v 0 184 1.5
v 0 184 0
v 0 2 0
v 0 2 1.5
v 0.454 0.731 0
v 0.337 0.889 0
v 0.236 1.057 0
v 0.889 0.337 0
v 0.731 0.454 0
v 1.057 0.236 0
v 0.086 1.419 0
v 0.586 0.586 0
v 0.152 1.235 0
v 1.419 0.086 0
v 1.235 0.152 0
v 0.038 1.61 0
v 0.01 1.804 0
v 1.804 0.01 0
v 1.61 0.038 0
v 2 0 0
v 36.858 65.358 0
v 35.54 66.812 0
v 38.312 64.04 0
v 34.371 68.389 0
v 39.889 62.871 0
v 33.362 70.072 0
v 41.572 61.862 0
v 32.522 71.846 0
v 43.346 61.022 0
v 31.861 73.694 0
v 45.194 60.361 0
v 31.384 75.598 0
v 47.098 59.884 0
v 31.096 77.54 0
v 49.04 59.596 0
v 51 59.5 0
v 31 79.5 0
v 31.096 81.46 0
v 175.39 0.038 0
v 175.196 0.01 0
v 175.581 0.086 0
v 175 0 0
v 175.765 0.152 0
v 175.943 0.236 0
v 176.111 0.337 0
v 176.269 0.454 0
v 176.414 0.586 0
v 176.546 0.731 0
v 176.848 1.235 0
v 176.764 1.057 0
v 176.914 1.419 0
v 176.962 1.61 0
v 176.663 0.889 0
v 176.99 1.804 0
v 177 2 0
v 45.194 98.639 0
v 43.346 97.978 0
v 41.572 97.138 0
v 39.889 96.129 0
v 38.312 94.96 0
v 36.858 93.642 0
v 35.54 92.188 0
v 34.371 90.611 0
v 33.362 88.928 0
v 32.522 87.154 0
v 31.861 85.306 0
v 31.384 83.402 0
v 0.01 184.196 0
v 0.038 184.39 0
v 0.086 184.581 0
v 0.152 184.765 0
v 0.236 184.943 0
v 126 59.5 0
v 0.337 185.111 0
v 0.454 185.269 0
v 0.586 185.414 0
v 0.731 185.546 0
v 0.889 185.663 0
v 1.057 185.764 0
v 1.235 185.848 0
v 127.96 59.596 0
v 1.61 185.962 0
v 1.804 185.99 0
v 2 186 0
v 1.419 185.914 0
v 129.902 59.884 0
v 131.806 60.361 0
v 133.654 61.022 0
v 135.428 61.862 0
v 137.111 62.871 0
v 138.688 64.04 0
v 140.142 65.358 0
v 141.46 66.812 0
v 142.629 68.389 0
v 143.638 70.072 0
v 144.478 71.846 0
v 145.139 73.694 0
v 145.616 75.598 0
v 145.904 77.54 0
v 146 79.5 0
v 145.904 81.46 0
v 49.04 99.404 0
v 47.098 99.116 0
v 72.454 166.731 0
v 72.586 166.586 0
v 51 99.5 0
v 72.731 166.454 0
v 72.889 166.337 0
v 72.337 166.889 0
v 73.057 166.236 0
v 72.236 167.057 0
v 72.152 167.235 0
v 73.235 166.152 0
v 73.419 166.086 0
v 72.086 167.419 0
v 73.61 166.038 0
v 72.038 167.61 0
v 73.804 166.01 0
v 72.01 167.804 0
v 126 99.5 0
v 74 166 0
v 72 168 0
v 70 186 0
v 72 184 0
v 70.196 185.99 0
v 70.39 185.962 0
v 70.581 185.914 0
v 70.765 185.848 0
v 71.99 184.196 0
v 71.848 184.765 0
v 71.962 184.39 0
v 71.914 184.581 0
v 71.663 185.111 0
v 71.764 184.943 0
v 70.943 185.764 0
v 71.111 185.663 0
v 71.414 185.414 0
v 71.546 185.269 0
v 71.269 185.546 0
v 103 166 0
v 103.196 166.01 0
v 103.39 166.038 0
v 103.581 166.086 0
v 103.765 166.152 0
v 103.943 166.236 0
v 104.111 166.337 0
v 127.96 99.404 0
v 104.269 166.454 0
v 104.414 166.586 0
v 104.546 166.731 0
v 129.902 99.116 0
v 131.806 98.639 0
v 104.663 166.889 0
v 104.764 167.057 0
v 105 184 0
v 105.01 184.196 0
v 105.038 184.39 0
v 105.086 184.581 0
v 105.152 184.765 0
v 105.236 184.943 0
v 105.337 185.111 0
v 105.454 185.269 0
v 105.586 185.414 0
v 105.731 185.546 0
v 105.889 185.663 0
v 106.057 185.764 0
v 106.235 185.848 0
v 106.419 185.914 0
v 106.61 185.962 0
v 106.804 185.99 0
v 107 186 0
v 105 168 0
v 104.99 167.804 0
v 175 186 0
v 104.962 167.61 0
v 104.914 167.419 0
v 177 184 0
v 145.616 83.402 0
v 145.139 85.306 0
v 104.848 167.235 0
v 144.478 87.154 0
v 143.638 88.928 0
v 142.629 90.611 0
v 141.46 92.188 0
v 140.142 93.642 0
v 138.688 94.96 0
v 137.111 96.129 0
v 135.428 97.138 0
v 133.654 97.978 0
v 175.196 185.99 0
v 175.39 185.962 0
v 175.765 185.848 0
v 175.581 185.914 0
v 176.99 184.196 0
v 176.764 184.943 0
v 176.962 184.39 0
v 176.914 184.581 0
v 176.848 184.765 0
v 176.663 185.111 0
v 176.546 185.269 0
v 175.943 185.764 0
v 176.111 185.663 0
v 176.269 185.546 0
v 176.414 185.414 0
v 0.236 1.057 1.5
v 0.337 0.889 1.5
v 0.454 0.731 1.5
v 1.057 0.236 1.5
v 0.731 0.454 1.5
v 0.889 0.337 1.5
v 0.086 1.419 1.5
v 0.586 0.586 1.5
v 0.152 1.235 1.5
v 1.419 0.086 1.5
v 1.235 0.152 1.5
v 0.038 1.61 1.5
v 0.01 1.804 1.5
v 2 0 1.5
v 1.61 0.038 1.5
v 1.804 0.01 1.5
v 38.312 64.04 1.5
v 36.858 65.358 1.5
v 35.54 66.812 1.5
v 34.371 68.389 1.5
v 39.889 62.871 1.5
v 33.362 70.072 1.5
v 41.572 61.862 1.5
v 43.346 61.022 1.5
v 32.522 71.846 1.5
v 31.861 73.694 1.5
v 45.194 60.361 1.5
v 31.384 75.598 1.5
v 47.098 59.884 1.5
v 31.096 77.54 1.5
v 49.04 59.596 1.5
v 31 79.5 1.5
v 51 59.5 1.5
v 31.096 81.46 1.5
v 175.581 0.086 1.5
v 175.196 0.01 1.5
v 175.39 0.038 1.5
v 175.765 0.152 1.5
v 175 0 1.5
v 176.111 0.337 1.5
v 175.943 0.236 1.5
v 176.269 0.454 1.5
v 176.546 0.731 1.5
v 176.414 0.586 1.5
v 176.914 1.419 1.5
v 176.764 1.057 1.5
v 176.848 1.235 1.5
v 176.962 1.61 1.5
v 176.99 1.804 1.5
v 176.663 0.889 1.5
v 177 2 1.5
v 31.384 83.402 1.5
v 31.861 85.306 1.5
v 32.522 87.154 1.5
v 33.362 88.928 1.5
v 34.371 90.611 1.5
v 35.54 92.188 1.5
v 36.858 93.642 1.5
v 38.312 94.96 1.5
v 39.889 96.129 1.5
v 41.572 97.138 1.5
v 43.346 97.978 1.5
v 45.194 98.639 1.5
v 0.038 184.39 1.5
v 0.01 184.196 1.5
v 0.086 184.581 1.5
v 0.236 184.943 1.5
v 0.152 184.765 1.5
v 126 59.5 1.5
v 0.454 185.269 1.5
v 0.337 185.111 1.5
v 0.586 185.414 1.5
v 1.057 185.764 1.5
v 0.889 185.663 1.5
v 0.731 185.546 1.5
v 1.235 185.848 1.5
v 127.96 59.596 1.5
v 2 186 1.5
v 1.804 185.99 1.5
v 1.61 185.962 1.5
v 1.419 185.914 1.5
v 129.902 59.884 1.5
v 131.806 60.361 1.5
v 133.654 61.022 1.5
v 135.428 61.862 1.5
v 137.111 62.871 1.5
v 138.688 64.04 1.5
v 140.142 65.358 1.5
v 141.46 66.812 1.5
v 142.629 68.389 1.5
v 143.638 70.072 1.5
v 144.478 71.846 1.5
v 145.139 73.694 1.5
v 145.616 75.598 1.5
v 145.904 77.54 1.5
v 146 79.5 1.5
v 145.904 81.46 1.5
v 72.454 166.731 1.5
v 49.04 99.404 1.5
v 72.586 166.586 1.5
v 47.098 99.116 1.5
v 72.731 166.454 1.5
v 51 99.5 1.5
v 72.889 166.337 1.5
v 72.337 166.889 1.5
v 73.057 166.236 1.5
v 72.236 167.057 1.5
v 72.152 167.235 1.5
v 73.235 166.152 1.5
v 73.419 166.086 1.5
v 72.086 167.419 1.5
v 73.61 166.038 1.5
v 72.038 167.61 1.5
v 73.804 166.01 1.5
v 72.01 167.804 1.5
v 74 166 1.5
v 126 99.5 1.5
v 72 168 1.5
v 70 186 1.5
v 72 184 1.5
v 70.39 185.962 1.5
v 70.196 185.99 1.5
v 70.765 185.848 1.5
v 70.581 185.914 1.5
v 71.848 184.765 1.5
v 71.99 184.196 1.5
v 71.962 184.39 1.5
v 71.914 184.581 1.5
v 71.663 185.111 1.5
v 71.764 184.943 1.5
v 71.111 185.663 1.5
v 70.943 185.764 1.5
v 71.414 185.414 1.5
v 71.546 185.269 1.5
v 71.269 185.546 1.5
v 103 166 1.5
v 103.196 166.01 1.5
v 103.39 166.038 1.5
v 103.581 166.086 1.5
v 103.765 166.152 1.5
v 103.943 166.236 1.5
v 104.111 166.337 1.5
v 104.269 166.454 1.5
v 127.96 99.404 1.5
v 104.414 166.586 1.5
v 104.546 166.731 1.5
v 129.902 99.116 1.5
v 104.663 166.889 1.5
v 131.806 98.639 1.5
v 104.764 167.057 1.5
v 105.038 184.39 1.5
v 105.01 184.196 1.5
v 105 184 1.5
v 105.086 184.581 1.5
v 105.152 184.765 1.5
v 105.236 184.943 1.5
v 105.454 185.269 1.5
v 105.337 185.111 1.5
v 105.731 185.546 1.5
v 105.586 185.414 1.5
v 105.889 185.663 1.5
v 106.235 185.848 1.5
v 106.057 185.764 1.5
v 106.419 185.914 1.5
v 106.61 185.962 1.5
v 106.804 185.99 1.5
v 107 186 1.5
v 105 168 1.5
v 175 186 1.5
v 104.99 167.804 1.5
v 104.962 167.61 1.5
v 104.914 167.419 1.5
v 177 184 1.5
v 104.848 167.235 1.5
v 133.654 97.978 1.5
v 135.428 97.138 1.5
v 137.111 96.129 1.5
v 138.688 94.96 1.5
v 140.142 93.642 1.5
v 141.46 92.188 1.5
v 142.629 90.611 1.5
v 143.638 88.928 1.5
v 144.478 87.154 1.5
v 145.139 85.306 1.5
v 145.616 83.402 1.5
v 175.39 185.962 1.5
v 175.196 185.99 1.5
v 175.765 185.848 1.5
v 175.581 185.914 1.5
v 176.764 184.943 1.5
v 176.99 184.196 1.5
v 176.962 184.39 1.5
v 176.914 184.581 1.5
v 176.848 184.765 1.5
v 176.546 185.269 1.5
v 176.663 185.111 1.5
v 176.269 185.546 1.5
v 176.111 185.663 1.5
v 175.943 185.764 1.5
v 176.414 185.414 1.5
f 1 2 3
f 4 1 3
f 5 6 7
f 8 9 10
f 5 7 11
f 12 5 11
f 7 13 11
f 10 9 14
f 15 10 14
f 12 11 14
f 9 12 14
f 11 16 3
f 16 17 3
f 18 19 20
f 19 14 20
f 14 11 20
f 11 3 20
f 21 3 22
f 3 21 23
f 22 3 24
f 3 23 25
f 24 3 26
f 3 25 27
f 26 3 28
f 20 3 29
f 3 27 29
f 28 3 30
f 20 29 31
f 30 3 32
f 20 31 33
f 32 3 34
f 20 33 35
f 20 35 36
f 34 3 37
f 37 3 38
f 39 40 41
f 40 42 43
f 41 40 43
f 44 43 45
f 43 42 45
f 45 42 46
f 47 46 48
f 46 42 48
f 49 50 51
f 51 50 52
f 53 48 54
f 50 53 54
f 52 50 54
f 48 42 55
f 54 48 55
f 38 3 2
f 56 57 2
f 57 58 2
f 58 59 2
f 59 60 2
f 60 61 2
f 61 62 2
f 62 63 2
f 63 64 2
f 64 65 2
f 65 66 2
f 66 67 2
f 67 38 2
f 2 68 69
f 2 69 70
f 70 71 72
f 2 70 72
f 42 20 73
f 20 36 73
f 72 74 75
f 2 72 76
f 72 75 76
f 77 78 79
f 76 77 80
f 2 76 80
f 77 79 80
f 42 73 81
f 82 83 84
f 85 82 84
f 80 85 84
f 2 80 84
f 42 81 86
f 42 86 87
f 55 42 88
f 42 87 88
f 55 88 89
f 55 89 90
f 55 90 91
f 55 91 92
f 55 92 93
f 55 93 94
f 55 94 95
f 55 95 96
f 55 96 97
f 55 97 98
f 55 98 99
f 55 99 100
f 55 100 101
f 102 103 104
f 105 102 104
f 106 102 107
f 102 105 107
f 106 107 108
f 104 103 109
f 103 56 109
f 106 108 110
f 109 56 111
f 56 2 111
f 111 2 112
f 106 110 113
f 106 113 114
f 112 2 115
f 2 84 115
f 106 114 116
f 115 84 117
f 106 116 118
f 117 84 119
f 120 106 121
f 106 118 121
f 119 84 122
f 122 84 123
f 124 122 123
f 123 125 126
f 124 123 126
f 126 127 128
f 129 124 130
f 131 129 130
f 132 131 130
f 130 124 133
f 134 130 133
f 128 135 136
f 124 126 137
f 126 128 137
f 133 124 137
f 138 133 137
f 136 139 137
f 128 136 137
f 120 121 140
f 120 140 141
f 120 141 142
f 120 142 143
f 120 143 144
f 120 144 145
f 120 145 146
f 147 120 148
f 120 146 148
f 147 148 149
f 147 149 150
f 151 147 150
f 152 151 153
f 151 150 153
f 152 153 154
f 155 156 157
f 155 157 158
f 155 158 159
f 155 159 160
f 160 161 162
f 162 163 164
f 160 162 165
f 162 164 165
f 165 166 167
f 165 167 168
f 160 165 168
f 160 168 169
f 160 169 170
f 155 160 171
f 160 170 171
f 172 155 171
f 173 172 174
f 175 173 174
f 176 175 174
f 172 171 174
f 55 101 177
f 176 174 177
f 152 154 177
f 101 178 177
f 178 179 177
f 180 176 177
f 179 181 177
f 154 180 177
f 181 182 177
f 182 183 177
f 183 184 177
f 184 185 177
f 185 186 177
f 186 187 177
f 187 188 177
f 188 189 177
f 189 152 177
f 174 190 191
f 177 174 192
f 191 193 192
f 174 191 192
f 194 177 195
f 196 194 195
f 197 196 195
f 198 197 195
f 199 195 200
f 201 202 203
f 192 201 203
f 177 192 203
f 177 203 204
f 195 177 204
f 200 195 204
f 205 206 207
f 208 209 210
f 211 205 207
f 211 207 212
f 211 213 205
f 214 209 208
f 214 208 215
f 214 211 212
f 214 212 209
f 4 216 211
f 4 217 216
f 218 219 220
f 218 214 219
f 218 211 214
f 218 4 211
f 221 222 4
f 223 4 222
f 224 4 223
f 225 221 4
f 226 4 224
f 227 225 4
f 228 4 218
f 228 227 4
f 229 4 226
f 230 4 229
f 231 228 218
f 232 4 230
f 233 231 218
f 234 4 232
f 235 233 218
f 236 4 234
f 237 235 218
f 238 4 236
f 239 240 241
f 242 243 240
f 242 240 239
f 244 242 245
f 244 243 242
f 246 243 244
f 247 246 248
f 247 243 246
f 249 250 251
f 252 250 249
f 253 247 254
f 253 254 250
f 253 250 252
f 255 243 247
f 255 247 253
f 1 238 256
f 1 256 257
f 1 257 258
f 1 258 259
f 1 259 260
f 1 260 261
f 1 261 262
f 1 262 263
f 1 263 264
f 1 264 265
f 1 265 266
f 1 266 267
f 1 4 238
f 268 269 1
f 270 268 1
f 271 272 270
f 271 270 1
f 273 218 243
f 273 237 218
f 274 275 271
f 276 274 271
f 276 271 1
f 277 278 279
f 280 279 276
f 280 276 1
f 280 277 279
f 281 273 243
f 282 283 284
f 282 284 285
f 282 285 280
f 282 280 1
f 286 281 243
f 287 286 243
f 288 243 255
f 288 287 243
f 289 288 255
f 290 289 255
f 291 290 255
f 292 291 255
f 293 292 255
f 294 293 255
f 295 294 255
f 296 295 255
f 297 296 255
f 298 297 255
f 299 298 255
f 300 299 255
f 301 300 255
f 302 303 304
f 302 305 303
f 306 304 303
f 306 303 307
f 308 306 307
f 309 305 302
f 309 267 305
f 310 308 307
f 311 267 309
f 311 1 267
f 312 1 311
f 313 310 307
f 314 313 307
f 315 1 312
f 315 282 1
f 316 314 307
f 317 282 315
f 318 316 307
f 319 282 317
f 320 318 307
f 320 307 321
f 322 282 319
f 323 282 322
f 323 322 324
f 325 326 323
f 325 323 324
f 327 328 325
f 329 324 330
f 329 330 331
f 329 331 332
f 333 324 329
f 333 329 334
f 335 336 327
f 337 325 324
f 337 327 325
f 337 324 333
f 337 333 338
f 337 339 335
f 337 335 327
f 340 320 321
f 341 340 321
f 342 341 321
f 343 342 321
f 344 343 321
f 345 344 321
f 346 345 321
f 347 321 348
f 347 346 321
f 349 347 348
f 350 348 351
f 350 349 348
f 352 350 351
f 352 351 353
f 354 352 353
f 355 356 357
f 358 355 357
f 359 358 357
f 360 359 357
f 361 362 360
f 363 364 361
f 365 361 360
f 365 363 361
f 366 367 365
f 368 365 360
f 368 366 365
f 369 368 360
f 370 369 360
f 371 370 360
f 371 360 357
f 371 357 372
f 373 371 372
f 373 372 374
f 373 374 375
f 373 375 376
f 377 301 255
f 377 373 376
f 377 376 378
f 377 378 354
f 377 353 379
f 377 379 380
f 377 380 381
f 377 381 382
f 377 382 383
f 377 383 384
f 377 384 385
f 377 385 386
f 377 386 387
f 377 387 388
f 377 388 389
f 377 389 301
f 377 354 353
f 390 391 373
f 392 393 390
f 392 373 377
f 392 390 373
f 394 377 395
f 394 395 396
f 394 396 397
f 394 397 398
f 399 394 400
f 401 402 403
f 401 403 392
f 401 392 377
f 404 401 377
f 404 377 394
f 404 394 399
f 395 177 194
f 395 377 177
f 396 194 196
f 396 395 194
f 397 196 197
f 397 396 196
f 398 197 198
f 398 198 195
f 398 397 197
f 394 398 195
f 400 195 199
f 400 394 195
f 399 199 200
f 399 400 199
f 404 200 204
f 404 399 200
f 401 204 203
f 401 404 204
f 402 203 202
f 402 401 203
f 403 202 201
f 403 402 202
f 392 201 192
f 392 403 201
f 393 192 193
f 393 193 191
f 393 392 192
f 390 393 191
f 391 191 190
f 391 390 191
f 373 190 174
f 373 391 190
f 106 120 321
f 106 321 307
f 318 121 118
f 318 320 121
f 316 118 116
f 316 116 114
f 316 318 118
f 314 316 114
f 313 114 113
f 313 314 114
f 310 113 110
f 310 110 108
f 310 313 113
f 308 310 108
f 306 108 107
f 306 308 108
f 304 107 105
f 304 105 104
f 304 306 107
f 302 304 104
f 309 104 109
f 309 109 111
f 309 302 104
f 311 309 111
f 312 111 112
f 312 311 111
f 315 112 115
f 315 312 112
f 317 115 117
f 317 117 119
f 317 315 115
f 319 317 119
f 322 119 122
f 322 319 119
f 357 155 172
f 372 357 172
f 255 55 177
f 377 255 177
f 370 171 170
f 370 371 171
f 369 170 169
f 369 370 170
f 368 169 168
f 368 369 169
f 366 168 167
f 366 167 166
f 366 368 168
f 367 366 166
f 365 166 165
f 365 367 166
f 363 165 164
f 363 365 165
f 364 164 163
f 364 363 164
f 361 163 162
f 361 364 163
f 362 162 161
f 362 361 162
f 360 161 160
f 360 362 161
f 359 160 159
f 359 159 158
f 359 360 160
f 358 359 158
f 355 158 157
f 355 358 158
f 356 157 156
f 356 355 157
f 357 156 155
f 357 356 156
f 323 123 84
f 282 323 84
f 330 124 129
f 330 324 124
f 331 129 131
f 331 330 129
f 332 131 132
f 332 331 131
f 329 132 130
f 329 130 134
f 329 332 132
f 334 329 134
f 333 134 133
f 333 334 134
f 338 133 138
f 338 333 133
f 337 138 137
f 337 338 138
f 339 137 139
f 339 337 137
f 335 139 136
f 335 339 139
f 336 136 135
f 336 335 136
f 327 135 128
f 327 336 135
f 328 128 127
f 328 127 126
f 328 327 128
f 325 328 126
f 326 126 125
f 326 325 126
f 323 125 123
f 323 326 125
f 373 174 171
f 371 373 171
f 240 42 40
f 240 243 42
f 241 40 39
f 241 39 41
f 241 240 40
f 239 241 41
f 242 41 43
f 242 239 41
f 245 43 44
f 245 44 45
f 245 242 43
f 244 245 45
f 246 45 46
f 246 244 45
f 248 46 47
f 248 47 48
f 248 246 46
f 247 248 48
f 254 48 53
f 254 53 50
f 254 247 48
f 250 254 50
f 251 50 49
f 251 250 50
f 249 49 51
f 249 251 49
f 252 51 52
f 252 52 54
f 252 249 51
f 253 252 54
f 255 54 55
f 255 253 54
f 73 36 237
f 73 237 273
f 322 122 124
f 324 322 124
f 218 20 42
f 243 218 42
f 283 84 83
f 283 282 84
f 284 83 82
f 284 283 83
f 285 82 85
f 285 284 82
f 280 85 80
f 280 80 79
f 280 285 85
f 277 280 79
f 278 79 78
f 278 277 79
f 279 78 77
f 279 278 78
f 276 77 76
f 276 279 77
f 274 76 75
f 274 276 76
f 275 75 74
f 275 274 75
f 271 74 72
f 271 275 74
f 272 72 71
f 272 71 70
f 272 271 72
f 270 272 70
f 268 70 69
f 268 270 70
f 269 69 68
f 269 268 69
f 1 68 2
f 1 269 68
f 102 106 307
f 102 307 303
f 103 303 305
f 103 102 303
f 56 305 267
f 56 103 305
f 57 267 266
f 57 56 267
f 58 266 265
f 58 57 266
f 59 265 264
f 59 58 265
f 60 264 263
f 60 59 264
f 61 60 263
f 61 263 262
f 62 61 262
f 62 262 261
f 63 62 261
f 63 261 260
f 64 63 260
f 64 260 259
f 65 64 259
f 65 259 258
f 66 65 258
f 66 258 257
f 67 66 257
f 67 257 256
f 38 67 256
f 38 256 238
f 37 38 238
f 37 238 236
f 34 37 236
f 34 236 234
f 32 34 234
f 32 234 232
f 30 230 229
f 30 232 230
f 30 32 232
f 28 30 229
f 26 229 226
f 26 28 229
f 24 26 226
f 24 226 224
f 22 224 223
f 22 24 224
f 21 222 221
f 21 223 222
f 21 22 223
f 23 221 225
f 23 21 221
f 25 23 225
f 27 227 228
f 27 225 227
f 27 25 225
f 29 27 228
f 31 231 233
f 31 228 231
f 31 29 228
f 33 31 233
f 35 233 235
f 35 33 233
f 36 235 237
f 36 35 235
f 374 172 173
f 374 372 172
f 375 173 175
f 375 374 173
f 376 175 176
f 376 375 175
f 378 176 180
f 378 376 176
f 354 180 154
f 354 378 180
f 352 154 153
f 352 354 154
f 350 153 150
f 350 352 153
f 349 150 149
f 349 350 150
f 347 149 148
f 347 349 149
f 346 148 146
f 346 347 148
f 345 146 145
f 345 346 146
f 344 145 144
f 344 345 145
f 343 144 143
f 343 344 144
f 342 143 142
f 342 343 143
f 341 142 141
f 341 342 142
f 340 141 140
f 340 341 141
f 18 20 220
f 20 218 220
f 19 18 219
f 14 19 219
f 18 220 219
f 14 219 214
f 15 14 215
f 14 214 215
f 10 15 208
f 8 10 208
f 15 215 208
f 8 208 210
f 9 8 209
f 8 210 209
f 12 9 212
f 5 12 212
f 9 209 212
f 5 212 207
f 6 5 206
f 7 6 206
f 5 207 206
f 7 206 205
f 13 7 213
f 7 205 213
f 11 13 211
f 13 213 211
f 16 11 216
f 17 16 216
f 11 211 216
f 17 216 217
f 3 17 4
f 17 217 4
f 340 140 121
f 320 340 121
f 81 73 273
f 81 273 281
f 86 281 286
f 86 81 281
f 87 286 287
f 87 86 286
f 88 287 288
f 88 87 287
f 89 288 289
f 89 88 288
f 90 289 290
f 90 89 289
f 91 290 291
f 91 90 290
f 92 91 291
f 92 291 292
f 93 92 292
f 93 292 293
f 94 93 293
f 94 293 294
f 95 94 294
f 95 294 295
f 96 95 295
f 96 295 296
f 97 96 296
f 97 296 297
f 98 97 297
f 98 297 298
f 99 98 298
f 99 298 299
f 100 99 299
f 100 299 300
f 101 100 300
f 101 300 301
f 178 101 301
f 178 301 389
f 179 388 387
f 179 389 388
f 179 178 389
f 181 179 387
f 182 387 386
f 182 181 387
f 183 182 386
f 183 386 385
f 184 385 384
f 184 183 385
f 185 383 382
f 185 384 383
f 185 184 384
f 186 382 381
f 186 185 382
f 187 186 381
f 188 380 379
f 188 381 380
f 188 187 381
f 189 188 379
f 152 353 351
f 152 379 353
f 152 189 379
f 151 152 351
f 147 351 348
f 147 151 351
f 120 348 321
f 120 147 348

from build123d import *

# Parameters (mm, degrees)
BOSS_EXTRUDE1_DEPTH = 1.5
FILLET1_R           = 2
CUT_EXTRUDE1_DEPTH  = 10


with BuildPart() as part:
    # Sketch1 → Boss-Extrude1 (new body)
    with BuildSketch(Plane.XY):
        Polygon((0, 0), (177, 0), (177, 186), (105, 186), (105, 166), (72, 166), (72, 186), (0, 186), align=None)
    extrude(amount=BOSS_EXTRUDE1_DEPTH)

    # Fillet1
    fillet1_edges = [part.edges().sort_by_distance(p)[0] for p in [
        (0, 186, 0.75),
        (72, 186, 0.75),
        (72, 166, 0.75),
        (105, 166, 0.75),
        (105, 186, 0.75),
        (177, 186, 0.75),
        (177, 0, 0.75),
        (0, 0, 0.75),
    ]]
    fillet(fillet1_edges, radius=FILLET1_R)

    # Sketch2 → Cut-Extrude1 (cut)
    with BuildSketch(Plane(origin=(0, 0, 0), x_dir=(-1, 0, 0), z_dir=(0, 0, -1))):
        with BuildLine():
            Line((-126, 99.5), (-51, 99.5))
            ThreePointArc((-51, 99.5), (-31, 79.5), (-51, 59.5))
            Line((-51, 59.5), (-126, 59.5))
            ThreePointArc((-126, 59.5), (-146, 79.5), (-126, 99.5))
        make_face()
    extrude(amount=-CUT_EXTRUDE1_DEPTH, mode=Mode.SUBTRACT)


solid = part.part
